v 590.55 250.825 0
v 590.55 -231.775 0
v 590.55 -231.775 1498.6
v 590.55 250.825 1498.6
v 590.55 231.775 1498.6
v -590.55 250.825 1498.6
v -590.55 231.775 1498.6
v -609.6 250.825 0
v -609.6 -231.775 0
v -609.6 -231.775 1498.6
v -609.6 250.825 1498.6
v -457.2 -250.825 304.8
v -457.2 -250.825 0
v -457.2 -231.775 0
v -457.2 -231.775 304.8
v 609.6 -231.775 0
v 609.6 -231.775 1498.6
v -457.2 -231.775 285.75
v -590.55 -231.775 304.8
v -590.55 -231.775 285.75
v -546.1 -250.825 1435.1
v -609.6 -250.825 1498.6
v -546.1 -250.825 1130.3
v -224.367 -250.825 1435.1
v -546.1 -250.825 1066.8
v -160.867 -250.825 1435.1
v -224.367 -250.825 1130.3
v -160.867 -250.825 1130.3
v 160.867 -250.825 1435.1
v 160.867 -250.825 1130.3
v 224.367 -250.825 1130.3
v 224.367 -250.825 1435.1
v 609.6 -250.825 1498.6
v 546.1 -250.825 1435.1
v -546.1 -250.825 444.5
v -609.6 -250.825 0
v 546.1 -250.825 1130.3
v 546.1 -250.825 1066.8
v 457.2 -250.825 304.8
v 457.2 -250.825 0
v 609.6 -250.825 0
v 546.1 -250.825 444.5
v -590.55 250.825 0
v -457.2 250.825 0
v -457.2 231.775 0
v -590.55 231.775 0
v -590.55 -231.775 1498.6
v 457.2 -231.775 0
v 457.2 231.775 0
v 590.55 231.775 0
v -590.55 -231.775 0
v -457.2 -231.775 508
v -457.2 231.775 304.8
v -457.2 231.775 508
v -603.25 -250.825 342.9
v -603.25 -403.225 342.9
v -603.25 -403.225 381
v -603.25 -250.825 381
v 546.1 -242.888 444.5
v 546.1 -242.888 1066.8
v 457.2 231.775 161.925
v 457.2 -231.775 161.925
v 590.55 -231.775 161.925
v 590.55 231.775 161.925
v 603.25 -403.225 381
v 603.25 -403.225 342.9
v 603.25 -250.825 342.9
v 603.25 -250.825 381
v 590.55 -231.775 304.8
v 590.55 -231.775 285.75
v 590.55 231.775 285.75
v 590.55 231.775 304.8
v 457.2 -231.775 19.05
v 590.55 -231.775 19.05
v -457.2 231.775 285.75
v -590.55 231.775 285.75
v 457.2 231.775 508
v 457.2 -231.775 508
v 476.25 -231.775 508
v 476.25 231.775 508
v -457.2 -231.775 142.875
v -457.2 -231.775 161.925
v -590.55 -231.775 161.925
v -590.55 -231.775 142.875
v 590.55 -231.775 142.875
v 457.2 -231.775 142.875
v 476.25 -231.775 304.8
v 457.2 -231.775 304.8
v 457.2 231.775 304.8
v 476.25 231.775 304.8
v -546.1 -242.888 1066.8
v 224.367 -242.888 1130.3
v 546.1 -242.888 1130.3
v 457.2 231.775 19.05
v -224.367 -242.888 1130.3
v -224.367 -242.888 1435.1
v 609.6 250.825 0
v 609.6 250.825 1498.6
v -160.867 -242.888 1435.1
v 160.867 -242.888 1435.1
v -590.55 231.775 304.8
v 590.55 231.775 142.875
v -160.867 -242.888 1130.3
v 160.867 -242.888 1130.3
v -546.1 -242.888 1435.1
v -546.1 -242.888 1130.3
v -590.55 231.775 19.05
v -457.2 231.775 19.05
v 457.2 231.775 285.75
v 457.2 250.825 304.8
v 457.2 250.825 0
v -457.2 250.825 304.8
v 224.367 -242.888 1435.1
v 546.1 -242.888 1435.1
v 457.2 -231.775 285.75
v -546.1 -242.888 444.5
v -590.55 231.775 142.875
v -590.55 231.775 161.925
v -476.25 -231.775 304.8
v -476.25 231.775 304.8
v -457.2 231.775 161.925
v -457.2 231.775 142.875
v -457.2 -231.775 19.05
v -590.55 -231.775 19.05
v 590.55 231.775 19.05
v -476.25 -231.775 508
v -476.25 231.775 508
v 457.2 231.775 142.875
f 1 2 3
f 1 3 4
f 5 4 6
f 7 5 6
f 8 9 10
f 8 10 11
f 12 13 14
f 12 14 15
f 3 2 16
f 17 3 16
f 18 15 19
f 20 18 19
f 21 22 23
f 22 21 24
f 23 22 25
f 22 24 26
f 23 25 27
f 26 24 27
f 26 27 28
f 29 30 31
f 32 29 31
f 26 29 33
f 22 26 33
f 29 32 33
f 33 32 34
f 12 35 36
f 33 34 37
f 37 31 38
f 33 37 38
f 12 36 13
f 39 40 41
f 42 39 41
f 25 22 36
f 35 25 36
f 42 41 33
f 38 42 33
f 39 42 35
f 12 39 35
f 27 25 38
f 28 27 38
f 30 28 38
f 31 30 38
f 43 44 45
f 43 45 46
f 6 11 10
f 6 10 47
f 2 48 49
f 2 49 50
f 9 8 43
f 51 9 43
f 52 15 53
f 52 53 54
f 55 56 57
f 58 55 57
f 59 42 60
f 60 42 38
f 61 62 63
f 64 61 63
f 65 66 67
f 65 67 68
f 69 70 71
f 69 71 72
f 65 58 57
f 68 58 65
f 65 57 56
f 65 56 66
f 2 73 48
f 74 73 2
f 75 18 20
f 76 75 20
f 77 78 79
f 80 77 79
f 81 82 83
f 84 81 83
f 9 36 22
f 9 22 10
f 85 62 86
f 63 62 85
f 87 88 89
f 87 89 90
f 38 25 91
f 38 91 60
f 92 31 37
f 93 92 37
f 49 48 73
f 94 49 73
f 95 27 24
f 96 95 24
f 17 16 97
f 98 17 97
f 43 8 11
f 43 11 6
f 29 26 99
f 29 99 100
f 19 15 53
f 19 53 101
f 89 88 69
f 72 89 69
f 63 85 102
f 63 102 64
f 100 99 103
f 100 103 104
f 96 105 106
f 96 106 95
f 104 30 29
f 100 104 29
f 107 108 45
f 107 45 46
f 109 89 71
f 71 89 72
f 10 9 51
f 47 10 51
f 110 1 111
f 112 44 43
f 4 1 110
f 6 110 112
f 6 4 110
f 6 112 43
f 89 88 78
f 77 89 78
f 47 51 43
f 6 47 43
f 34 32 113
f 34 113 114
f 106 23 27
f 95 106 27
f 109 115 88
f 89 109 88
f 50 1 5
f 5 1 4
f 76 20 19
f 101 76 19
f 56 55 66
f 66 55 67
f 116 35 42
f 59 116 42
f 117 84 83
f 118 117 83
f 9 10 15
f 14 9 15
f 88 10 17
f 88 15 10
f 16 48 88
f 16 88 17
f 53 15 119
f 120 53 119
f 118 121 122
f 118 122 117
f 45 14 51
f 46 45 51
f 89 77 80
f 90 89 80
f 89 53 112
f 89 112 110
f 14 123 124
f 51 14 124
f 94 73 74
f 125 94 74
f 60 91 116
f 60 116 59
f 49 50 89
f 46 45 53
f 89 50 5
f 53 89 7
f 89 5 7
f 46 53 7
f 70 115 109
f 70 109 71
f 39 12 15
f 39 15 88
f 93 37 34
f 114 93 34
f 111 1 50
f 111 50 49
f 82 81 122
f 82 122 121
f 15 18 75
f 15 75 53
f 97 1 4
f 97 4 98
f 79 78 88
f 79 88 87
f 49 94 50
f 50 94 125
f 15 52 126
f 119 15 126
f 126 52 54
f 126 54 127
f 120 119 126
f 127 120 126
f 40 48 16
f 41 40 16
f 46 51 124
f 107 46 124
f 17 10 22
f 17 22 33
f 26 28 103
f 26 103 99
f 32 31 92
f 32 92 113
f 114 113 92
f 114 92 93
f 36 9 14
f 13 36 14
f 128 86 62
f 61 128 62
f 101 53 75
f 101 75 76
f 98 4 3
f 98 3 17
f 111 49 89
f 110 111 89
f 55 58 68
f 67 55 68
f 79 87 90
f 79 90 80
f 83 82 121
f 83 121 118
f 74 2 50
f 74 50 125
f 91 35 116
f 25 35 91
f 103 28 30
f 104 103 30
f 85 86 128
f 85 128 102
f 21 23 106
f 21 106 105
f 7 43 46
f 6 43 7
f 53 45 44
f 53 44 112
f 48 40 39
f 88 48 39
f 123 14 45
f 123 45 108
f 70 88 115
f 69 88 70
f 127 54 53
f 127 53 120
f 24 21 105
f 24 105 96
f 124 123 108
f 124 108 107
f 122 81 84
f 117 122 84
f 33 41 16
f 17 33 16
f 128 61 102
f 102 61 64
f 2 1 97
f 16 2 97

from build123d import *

# Parameters (mm, degrees)
F2_W      = 1219.2
F2_H      = 19.05
F3_DEPTH  = 1498.6
F4_W      = 19.05
F4_H      = 482.6
F5_DEPTH  = 1498.6
F6_W      = 1181.1
F6_H      = 1498.6
F7_DEPTH  = 19.05
F8_W      = 914.4
F8_H      = 304.8
F9_DEPTH  = 501.65
F10_W     = 133.35
F10_H     = 19.05
F11_DEPTH = 463.55
F12_W     = 19.05
F12_H     = 203.2
F13_DEPTH = 463.55
F15_W     = 1206.5
F15_H     = 38.1
F16_DEPTH = 152.4
F17_W     = 321.733333
F17_H     = 304.8
F17_W_2   = 321.733334
F17_W_3   = 1092.2
F17_H_2   = 622.3
F18_DEPTH = 7.9375


with BuildPart() as f3:
    # F2 (on Top) → F3 (new body, through all)
    with BuildSketch(Plane.XY):
        with Locations((0, -241.3)):
            Rectangle(F2_W, F2_H)
    extrude(amount=F3_DEPTH)


with BuildPart() as f5:
    # F4 (on Top) → F5 (new body, through all)
    with BuildSketch(Plane.XY):
        with Locations((-600.075, 9.525)):
            Rectangle(F4_W, F4_H)
        with Locations((600.075, 9.525)):
            Rectangle(F4_W, F4_H)
    extrude(amount=F5_DEPTH)


with BuildPart() as f7:
    # F6 (on face) → F7 (new body)
    with BuildSketch(Plane(origin=(0, 250.825, 0), x_dir=(-1, 0, 0), z_dir=(0, 1, 0))):
        with Locations((0, 749.3)):
            Rectangle(F6_W, F6_H)
    extrude(amount=-F7_DEPTH)


with BuildPart() as f9_tool:
    # F8 (on face) → F9 (new body, through all)
    with BuildSketch(Plane.XZ.offset(250.825)):
        with Locations((0, 152.4)):
            Rectangle(F8_W, F8_H)
    extrude(amount=-F9_DEPTH)


with BuildPart() as f3_1:
    add(f3.part)

    # F9: cut by f9_tool
    add(f9_tool.part, mode=Mode.SUBTRACT)

    # F17 (on face) → F18 (cut)
    with BuildSketch(Plane.XZ.offset(250.825)):
        with Locations((-385.233334, 1282.7)):
            Rectangle(F17_W, F17_H)
        with Locations((0, 1282.7)):
            Rectangle(F17_W_2, F17_H)
        with Locations((385.233334, 1282.7)):
            Rectangle(F17_W, F17_H)
        with Locations((0, 755.65)):
            Rectangle(F17_W_3, F17_H_2)
    extrude(amount=-F18_DEPTH, mode=Mode.SUBTRACT)


with BuildPart() as f7_1:
    add(f7.part)

    # F9: cut by f9_tool
    add(f9_tool.part, mode=Mode.SUBTRACT)


with BuildPart() as f11:
    # F10 (on face) → F11 (new body, through all)
    with BuildSketch(Plane(origin=(0, -231.775, 0), x_dir=(-1, 0, 0), z_dir=(0, 1, 0))):
        with Locations((523.875, 9.525)):
            Rectangle(F10_W, F10_H)
        with Locations((523.875, 295.275)):
            Rectangle(F10_W, F10_H)
        with Locations((523.875, 152.4)):
            Rectangle(F10_W, F10_H)
    extrude(amount=F11_DEPTH)


with BuildPart() as f13:
    # F12 (on face) → F13 (new body, through all)
    with BuildSketch(Plane(origin=(0, -231.775, 0), x_dir=(-1, 0, 0), z_dir=(0, 1, 0))):
        with Locations((466.725, 406.4)):
            Rectangle(F12_W, F12_H)
    extrude(amount=F13_DEPTH)


with BuildPart() as f14_1:
    # F14: instance of F13
    add(f13.part.mirror(Plane.YZ))


with BuildPart() as f14_2:
    # F14: instance of F11
    add(f11.part.mirror(Plane.YZ))


with BuildPart() as f16:
    # F15 (on face) → F16 (new body)
    with BuildSketch(Plane.XZ.offset(250.825)):
        with Locations((0, 361.95)):
            Rectangle(F15_W, F15_H)
    extrude(amount=F16_DEPTH)


solid = Compound([f5.part, f3_1.part, f7_1.part, f11.part, f13.part, f14_1.part, f14_2.part, f16.part])
